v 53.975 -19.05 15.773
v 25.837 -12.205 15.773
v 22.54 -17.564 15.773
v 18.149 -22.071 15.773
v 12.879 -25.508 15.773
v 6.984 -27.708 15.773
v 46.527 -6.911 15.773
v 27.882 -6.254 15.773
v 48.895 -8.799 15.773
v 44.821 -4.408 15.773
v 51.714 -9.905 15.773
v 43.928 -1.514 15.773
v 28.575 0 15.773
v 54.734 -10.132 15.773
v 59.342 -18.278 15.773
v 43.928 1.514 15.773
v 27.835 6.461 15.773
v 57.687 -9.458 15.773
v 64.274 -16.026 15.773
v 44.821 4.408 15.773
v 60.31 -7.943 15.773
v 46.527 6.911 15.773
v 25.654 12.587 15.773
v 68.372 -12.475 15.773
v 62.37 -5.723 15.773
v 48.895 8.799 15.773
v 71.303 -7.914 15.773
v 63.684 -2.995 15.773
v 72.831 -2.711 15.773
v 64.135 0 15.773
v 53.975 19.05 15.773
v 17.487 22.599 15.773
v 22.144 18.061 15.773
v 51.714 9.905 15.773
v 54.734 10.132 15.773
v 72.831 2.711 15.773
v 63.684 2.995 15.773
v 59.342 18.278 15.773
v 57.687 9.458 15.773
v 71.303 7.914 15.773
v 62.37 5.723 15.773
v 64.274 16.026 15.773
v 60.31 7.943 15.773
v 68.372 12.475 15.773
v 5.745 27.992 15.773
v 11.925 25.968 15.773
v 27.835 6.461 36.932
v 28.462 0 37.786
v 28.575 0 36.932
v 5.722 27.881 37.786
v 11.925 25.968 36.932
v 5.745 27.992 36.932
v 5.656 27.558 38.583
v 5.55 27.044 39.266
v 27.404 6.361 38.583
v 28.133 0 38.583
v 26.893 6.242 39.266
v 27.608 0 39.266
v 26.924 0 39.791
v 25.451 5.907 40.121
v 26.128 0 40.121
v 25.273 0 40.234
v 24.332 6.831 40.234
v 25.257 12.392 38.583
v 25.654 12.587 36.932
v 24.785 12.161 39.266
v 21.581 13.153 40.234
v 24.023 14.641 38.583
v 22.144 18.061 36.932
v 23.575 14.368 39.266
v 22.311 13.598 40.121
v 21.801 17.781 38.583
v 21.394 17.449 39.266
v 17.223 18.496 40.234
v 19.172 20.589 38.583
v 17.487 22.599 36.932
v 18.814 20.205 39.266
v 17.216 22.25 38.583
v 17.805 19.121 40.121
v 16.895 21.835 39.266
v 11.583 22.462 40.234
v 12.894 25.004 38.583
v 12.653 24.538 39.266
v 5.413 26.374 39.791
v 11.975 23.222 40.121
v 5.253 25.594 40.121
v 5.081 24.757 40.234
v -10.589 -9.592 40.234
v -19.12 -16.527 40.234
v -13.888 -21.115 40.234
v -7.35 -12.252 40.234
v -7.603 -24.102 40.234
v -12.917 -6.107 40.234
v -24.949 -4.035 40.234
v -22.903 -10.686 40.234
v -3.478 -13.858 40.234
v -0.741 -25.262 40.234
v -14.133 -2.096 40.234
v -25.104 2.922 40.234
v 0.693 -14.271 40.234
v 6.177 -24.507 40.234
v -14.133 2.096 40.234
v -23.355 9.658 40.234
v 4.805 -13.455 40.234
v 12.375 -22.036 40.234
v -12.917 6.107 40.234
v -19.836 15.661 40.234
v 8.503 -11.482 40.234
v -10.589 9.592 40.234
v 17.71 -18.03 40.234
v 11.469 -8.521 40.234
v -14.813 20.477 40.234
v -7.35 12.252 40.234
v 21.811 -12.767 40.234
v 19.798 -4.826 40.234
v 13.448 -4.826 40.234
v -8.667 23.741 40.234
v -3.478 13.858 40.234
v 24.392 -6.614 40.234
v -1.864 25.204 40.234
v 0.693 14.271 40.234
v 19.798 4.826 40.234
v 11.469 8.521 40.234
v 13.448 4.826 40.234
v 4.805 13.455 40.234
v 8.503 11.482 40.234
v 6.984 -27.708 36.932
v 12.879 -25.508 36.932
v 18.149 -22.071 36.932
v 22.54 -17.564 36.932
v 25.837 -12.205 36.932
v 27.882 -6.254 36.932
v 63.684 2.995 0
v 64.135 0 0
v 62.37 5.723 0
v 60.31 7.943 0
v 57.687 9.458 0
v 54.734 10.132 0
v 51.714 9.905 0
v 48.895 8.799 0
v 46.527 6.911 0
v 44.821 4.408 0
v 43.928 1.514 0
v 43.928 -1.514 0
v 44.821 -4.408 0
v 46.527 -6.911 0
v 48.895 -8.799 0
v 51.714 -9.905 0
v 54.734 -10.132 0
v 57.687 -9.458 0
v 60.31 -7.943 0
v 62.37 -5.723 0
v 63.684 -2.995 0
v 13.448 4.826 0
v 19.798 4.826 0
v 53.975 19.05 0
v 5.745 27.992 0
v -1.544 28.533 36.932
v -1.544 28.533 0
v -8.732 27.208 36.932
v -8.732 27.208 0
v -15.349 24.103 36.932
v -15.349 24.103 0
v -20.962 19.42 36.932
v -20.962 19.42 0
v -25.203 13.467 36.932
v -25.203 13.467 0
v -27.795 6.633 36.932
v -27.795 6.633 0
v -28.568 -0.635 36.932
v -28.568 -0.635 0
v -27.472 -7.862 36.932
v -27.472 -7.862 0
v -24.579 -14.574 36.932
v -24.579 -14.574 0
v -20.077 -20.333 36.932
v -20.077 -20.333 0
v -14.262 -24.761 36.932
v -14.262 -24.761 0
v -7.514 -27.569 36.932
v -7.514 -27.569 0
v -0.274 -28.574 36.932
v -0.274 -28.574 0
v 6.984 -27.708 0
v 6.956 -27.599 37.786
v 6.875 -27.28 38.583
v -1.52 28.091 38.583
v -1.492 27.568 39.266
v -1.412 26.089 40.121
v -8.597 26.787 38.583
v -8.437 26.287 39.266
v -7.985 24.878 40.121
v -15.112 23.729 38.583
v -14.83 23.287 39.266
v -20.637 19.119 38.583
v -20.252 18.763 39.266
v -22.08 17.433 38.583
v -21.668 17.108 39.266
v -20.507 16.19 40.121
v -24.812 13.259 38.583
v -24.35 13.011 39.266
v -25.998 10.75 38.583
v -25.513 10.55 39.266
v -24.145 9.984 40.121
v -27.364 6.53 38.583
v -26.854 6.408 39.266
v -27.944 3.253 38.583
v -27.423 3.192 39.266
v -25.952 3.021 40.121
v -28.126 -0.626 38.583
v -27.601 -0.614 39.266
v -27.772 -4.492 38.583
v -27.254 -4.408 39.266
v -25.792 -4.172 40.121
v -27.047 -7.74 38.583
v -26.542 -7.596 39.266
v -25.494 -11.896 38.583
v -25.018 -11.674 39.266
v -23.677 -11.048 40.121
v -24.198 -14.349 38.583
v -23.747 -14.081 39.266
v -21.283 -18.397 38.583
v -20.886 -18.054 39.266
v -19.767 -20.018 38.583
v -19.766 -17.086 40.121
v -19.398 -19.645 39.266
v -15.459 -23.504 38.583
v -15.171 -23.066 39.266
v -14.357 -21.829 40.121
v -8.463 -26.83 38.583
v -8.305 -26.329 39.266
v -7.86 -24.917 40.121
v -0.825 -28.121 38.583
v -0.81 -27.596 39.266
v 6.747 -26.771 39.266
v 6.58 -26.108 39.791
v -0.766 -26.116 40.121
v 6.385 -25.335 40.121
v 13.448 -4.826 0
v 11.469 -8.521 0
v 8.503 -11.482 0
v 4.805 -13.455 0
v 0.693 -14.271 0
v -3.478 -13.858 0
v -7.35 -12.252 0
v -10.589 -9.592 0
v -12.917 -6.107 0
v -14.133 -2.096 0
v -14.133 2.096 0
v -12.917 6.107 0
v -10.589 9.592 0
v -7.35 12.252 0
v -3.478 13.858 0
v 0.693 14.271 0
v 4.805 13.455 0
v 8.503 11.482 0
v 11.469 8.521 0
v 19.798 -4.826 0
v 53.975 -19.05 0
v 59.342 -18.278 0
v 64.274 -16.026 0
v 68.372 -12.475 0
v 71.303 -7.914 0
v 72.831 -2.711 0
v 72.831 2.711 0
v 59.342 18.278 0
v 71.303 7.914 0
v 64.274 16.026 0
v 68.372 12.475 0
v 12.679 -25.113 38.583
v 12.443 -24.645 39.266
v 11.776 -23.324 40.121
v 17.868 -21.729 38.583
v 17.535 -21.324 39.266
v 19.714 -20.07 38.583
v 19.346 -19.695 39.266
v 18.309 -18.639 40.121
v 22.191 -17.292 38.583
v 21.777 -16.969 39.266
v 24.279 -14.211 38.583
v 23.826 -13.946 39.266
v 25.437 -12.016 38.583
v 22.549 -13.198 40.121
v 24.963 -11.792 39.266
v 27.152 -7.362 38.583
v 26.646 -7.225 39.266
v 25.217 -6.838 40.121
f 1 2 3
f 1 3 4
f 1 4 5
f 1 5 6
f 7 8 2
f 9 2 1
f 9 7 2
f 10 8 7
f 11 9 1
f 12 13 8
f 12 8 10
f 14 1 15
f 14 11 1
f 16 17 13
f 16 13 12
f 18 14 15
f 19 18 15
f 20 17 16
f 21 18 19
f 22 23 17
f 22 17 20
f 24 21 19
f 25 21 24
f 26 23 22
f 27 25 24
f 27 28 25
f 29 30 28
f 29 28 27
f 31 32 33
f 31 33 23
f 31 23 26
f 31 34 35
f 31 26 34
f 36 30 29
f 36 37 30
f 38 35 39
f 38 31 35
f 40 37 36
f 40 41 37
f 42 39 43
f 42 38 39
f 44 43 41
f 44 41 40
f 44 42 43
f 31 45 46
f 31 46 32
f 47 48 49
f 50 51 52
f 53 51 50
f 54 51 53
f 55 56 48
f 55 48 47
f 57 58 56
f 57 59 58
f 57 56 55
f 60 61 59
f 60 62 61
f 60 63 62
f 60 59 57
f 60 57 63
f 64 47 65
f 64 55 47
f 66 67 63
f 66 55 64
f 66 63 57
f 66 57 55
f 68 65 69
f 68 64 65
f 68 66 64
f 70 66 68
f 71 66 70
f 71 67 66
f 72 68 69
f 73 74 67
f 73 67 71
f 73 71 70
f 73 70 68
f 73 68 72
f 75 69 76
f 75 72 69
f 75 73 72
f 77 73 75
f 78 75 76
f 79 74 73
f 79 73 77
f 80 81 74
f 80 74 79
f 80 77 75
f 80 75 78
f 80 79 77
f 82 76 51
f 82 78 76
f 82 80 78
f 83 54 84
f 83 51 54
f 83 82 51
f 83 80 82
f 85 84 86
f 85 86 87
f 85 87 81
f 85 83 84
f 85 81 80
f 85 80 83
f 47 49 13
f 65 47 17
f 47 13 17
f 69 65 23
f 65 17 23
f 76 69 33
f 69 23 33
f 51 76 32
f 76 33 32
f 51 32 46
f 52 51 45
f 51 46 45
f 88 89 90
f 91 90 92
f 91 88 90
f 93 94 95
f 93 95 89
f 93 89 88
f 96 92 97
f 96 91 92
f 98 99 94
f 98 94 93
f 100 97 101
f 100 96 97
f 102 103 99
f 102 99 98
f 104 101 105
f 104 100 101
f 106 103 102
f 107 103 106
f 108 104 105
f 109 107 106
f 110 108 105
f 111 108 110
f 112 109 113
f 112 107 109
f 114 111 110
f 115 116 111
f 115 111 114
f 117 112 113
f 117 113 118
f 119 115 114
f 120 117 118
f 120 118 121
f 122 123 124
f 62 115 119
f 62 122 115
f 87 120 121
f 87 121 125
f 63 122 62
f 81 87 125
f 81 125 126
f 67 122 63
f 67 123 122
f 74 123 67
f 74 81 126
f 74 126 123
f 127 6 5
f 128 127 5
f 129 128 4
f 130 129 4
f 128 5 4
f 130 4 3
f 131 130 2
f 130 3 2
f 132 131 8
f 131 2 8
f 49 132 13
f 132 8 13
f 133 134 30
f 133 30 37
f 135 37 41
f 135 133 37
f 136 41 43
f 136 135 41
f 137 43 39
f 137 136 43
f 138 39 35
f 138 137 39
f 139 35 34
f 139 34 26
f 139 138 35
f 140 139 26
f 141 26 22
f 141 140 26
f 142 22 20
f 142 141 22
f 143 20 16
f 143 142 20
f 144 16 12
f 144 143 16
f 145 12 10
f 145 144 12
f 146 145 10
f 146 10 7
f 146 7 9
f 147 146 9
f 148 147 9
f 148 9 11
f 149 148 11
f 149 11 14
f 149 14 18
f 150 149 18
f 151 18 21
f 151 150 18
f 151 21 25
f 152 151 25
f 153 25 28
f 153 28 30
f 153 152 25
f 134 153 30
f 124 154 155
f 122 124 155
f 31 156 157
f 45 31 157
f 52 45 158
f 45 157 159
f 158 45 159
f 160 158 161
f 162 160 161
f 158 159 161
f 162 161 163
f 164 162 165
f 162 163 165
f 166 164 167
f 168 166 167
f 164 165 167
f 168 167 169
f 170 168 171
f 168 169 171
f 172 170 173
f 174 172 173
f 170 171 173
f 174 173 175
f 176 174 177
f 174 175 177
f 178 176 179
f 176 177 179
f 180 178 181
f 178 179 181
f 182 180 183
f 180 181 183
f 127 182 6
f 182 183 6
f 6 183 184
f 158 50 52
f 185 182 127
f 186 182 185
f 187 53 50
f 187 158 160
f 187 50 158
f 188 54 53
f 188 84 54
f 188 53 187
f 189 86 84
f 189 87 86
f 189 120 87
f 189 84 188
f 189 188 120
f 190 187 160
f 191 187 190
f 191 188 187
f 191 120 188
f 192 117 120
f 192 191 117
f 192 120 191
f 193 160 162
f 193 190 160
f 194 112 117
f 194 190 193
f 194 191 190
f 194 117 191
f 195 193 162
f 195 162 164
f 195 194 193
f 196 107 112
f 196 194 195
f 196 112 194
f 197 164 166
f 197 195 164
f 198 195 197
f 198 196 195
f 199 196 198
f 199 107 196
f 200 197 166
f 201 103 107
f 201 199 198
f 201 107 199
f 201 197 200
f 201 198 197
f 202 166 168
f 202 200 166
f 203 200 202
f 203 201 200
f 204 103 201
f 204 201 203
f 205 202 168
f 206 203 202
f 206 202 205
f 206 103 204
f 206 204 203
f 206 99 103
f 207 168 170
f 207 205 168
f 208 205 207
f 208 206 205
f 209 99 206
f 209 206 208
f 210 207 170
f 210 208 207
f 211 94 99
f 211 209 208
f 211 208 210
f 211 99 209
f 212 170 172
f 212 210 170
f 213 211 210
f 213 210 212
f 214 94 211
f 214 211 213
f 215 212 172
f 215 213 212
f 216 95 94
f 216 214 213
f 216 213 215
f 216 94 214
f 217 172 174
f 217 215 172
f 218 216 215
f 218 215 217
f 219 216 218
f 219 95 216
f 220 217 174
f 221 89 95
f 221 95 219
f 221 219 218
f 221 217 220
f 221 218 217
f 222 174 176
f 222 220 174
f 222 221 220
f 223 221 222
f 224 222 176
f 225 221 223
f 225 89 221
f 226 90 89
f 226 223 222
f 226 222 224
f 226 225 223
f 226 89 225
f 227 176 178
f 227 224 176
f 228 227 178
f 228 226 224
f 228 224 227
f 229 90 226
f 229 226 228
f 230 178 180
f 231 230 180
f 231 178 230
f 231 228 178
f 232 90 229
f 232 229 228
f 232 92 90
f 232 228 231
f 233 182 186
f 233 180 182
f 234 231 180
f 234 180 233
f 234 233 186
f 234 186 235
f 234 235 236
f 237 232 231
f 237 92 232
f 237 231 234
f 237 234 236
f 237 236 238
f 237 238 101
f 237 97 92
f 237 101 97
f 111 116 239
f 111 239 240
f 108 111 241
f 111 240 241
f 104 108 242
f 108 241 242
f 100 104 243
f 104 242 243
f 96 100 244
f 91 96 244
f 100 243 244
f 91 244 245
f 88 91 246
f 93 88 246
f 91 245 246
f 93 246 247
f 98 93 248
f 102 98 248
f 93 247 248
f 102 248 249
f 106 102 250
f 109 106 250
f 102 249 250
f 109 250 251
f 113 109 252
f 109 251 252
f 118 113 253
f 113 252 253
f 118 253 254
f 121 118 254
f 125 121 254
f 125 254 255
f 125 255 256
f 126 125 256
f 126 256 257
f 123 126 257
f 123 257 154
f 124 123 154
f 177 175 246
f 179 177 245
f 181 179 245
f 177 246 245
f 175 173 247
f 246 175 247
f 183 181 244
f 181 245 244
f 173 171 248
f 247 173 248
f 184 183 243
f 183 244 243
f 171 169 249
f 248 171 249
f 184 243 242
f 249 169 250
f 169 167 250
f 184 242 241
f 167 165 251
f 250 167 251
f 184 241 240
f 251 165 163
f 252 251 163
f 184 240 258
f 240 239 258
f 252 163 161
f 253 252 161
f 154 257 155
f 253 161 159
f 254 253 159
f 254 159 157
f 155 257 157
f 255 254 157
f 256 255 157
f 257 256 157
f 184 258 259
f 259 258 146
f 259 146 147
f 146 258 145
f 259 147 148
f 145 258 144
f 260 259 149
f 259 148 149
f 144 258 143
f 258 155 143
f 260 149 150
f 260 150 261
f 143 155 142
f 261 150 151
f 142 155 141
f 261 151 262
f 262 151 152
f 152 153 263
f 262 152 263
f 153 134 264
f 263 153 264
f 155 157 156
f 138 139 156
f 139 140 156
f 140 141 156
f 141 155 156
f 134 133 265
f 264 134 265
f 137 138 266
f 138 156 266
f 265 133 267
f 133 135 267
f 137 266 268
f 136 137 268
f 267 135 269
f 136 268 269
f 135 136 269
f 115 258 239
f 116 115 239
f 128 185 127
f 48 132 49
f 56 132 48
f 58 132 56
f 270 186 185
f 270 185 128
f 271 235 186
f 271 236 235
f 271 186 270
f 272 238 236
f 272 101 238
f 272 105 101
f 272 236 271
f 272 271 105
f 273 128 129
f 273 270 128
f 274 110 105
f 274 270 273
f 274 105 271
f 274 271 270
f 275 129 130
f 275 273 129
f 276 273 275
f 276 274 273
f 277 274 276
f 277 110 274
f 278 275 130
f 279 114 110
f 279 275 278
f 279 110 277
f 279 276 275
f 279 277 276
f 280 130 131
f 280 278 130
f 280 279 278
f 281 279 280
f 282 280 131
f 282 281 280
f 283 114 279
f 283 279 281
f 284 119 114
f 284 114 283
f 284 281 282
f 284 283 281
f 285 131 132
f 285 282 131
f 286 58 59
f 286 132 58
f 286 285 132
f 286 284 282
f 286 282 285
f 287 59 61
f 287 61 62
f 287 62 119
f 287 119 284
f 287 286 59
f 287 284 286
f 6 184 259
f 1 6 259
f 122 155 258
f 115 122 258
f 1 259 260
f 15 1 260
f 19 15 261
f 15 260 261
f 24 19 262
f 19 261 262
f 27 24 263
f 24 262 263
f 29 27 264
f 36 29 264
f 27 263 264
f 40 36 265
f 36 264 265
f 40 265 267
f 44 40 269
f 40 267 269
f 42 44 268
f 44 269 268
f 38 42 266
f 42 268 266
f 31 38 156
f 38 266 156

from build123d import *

# Parameters (mm, degrees)
F1_DEPTH = 40.2336
F0_R     = 10.16
F2_DEPTH = 15.7734
F3_R     = 3.302


# Not quite as in the source:
# - a feature names something its author has since deleted; it is built from what else it names


with BuildPart() as f1:
    # F0 (on Top) → F1 (new body)
    with BuildSketch(Plane.XY):
        with BuildLine():
            ThreePointArc((6.9836113022, -27.7084788139), (22.5398238454, -17.5637970274), (28.575, 0))
            ThreePointArc((28.575, 0), (22.1437005793, 18.0606519721), (5.7447533049, 27.9915779203))
            ThreePointArc((5.7447533049, 27.9915779203), (-28.5679347598, -0.6353963805), (6.9836113022, -27.7084788139))
        make_face()
        with BuildLine():
            ThreePointArc((13.4477648793, -4.826), (-14.2875, 0), (13.4477648793, 4.826))
            Line((13.4477648793, 4.826), (19.7977648793, 4.826))
            Line((19.7977648793, 4.826), (19.7977648793, -4.826))
            Line((19.7977648793, -4.826), (13.4477648793, -4.826))
        make_face(mode=Mode.SUBTRACT)
    extrude(amount=F1_DEPTH)

    # F0 (on Top) → F2 (join)
    with BuildSketch(Plane.XY):
        with BuildLine():
            ThreePointArc((5.7447533049, 27.9915779203), (22.1437005793, 18.0606519721), (28.575, 0))
            ThreePointArc((28.575, 0), (22.5398238454, -17.5637970274), (6.9836113022, -27.7084788139))
            Line((6.9836113022, -27.7084788139), (53.975, -19.05))
            ThreePointArc((53.975, -19.05), (34.925, 0), (53.975, 19.05))
            Line((53.975, 19.05), (5.7447533049, 27.9915779203))
        make_face()
        with BuildLine():
            ThreePointArc((73.025, 0), (67.4453841816, 13.4703841816), (53.975, 19.05))
            ThreePointArc((53.975, 19.05), (34.925, 0), (53.975, -19.05))
            ThreePointArc((53.975, -19.05), (67.4453841816, -13.4703841816), (73.025, 0))
        make_face()
        with Locations((53.975, 0)):
            Circle(F0_R, mode=Mode.SUBTRACT)
    extrude(amount=F2_DEPTH)

    # F3
    f3_edges = [f1.edges().sort_by_distance(p)[0] for p in [
        (-6.983611, 27.708479, 40.2336),
    ]]
    fillet(f3_edges, radius=F3_R)


solid = f1.part
